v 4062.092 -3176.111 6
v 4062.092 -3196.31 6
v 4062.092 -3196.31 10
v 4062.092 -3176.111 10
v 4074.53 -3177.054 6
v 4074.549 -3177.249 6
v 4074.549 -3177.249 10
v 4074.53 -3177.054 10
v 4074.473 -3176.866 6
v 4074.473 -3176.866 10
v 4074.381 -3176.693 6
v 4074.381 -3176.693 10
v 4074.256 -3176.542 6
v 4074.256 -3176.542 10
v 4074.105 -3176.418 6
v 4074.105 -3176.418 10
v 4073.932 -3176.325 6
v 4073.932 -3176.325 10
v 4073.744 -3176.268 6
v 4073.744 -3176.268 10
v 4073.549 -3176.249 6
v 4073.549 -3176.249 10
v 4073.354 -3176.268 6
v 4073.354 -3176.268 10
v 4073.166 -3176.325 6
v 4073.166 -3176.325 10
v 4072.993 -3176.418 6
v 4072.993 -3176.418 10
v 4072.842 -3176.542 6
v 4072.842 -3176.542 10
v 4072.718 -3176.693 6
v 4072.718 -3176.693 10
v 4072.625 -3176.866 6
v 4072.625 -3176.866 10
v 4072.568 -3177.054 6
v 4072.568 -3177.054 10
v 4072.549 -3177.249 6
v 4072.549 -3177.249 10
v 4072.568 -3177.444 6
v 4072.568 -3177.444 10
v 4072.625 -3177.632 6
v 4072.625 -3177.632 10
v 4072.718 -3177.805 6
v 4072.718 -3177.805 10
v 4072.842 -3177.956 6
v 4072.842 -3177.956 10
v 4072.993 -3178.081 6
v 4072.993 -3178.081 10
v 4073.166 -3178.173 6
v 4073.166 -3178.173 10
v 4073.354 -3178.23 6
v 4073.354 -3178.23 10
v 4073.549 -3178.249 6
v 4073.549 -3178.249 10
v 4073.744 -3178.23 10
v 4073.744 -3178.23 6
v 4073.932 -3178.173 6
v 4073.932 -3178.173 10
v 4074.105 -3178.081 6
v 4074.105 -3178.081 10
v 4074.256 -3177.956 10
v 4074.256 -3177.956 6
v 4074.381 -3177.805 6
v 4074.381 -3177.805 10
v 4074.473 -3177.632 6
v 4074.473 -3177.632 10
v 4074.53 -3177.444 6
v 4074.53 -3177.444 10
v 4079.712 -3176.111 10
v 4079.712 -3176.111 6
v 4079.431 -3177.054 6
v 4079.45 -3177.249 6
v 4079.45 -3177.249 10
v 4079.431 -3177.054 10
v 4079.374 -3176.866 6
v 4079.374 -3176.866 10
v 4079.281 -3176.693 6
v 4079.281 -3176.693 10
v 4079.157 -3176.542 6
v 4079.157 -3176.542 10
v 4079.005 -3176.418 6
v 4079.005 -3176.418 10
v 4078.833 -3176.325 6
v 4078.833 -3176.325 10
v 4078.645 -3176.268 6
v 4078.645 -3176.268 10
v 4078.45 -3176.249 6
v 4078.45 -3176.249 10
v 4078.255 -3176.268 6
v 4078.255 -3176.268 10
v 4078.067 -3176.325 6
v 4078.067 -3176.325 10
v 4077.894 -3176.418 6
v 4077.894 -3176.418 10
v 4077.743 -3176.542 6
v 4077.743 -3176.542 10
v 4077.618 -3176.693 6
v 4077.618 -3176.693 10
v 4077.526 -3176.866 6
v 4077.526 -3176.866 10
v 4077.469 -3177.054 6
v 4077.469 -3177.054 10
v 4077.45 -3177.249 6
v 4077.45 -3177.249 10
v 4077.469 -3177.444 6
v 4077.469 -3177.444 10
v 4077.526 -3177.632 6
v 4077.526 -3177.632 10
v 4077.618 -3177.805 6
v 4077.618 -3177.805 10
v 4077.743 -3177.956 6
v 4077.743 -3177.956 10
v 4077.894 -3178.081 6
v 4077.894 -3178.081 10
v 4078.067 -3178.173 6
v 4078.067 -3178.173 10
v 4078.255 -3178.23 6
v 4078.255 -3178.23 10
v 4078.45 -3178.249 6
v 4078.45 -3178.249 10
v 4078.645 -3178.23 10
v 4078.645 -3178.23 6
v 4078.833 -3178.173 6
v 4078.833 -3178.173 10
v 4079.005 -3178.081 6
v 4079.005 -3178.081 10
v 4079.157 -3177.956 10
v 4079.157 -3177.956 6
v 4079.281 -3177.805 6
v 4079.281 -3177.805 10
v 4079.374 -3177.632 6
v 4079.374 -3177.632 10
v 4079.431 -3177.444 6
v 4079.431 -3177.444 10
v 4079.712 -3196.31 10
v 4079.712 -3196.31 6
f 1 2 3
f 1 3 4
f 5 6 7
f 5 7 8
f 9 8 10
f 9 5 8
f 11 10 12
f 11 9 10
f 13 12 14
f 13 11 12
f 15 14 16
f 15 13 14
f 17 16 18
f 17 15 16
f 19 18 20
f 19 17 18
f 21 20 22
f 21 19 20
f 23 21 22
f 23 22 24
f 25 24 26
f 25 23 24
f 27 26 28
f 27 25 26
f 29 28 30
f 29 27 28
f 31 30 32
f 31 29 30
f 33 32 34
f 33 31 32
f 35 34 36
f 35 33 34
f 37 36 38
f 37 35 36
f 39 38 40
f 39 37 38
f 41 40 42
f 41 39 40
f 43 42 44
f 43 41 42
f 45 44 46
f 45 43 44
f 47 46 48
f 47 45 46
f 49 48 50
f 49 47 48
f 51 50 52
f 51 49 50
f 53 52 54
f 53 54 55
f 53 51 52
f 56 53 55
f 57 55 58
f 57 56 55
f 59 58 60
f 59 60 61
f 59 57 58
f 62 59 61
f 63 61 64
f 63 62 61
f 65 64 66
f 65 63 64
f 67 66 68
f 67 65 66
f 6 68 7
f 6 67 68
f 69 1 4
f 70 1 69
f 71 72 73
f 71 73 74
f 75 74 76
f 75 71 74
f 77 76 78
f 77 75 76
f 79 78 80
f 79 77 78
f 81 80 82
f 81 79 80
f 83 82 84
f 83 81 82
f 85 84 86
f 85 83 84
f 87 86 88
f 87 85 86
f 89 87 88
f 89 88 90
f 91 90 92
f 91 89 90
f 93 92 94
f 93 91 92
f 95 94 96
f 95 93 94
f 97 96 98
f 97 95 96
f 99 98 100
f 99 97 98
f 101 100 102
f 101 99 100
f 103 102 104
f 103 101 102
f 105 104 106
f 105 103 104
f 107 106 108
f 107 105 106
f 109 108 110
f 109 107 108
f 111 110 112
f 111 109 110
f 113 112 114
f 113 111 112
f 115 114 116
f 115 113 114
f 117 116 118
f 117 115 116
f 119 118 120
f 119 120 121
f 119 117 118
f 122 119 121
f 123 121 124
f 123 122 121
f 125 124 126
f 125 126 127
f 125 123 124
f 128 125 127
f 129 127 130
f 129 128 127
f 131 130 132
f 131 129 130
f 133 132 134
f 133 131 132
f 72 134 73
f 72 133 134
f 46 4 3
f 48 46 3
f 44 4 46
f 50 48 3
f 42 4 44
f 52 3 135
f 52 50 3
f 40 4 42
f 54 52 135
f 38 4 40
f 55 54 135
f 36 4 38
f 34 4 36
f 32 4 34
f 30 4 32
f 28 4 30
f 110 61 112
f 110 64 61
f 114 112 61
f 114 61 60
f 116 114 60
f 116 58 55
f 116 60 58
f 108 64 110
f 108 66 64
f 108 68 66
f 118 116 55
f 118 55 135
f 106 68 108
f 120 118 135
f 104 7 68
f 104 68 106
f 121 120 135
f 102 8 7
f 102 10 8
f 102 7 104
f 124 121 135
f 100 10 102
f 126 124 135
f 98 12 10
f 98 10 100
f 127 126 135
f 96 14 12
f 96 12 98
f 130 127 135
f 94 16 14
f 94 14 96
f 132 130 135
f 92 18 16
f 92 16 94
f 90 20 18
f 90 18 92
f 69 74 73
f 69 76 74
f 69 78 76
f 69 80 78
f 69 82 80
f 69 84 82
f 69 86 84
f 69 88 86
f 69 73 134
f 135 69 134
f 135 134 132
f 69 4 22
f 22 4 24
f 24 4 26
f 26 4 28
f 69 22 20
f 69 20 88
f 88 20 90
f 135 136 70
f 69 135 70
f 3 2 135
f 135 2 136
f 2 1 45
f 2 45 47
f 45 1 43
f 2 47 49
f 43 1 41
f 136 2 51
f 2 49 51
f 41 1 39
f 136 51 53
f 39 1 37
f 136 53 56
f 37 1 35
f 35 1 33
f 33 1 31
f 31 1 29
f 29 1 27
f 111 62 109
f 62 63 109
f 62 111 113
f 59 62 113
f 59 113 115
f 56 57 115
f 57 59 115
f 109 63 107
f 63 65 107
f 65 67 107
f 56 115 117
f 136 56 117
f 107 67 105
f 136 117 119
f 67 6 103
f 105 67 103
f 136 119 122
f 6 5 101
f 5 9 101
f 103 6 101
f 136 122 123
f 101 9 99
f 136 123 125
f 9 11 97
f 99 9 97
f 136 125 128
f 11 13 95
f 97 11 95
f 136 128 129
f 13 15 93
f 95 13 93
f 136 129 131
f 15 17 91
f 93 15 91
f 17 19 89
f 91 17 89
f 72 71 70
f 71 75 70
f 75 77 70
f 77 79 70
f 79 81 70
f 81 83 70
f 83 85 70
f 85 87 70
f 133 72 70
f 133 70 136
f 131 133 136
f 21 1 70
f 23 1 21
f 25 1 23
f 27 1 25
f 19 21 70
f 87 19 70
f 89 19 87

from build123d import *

# Parameters (mm, degrees)
EXTRUDE_START   = 6
SKETCH_4_W      = 17.619983613
SKETCH_4_H      = 20.199783613
SKETCH_4_R      = 1
EXTRUDE_1_DEPTH = 4


with BuildPart() as part:
    # 草图4 → 凸台-拉伸1 (new body)
    with BuildSketch(Plane.XY.offset(EXTRUDE_START)):
        with Locations((4070.90198202, -3186.21042393)):
            Rectangle(SKETCH_4_W, SKETCH_4_H)
        with Locations((4073.549032956, -3177.249070092)):
            Circle(SKETCH_4_R, mode=Mode.SUBTRACT)
        with Locations((4078.449868123, -3177.249070092)):
            Circle(SKETCH_4_R, mode=Mode.SUBTRACT)
    extrude(amount=EXTRUDE_1_DEPTH)


solid = part.part
